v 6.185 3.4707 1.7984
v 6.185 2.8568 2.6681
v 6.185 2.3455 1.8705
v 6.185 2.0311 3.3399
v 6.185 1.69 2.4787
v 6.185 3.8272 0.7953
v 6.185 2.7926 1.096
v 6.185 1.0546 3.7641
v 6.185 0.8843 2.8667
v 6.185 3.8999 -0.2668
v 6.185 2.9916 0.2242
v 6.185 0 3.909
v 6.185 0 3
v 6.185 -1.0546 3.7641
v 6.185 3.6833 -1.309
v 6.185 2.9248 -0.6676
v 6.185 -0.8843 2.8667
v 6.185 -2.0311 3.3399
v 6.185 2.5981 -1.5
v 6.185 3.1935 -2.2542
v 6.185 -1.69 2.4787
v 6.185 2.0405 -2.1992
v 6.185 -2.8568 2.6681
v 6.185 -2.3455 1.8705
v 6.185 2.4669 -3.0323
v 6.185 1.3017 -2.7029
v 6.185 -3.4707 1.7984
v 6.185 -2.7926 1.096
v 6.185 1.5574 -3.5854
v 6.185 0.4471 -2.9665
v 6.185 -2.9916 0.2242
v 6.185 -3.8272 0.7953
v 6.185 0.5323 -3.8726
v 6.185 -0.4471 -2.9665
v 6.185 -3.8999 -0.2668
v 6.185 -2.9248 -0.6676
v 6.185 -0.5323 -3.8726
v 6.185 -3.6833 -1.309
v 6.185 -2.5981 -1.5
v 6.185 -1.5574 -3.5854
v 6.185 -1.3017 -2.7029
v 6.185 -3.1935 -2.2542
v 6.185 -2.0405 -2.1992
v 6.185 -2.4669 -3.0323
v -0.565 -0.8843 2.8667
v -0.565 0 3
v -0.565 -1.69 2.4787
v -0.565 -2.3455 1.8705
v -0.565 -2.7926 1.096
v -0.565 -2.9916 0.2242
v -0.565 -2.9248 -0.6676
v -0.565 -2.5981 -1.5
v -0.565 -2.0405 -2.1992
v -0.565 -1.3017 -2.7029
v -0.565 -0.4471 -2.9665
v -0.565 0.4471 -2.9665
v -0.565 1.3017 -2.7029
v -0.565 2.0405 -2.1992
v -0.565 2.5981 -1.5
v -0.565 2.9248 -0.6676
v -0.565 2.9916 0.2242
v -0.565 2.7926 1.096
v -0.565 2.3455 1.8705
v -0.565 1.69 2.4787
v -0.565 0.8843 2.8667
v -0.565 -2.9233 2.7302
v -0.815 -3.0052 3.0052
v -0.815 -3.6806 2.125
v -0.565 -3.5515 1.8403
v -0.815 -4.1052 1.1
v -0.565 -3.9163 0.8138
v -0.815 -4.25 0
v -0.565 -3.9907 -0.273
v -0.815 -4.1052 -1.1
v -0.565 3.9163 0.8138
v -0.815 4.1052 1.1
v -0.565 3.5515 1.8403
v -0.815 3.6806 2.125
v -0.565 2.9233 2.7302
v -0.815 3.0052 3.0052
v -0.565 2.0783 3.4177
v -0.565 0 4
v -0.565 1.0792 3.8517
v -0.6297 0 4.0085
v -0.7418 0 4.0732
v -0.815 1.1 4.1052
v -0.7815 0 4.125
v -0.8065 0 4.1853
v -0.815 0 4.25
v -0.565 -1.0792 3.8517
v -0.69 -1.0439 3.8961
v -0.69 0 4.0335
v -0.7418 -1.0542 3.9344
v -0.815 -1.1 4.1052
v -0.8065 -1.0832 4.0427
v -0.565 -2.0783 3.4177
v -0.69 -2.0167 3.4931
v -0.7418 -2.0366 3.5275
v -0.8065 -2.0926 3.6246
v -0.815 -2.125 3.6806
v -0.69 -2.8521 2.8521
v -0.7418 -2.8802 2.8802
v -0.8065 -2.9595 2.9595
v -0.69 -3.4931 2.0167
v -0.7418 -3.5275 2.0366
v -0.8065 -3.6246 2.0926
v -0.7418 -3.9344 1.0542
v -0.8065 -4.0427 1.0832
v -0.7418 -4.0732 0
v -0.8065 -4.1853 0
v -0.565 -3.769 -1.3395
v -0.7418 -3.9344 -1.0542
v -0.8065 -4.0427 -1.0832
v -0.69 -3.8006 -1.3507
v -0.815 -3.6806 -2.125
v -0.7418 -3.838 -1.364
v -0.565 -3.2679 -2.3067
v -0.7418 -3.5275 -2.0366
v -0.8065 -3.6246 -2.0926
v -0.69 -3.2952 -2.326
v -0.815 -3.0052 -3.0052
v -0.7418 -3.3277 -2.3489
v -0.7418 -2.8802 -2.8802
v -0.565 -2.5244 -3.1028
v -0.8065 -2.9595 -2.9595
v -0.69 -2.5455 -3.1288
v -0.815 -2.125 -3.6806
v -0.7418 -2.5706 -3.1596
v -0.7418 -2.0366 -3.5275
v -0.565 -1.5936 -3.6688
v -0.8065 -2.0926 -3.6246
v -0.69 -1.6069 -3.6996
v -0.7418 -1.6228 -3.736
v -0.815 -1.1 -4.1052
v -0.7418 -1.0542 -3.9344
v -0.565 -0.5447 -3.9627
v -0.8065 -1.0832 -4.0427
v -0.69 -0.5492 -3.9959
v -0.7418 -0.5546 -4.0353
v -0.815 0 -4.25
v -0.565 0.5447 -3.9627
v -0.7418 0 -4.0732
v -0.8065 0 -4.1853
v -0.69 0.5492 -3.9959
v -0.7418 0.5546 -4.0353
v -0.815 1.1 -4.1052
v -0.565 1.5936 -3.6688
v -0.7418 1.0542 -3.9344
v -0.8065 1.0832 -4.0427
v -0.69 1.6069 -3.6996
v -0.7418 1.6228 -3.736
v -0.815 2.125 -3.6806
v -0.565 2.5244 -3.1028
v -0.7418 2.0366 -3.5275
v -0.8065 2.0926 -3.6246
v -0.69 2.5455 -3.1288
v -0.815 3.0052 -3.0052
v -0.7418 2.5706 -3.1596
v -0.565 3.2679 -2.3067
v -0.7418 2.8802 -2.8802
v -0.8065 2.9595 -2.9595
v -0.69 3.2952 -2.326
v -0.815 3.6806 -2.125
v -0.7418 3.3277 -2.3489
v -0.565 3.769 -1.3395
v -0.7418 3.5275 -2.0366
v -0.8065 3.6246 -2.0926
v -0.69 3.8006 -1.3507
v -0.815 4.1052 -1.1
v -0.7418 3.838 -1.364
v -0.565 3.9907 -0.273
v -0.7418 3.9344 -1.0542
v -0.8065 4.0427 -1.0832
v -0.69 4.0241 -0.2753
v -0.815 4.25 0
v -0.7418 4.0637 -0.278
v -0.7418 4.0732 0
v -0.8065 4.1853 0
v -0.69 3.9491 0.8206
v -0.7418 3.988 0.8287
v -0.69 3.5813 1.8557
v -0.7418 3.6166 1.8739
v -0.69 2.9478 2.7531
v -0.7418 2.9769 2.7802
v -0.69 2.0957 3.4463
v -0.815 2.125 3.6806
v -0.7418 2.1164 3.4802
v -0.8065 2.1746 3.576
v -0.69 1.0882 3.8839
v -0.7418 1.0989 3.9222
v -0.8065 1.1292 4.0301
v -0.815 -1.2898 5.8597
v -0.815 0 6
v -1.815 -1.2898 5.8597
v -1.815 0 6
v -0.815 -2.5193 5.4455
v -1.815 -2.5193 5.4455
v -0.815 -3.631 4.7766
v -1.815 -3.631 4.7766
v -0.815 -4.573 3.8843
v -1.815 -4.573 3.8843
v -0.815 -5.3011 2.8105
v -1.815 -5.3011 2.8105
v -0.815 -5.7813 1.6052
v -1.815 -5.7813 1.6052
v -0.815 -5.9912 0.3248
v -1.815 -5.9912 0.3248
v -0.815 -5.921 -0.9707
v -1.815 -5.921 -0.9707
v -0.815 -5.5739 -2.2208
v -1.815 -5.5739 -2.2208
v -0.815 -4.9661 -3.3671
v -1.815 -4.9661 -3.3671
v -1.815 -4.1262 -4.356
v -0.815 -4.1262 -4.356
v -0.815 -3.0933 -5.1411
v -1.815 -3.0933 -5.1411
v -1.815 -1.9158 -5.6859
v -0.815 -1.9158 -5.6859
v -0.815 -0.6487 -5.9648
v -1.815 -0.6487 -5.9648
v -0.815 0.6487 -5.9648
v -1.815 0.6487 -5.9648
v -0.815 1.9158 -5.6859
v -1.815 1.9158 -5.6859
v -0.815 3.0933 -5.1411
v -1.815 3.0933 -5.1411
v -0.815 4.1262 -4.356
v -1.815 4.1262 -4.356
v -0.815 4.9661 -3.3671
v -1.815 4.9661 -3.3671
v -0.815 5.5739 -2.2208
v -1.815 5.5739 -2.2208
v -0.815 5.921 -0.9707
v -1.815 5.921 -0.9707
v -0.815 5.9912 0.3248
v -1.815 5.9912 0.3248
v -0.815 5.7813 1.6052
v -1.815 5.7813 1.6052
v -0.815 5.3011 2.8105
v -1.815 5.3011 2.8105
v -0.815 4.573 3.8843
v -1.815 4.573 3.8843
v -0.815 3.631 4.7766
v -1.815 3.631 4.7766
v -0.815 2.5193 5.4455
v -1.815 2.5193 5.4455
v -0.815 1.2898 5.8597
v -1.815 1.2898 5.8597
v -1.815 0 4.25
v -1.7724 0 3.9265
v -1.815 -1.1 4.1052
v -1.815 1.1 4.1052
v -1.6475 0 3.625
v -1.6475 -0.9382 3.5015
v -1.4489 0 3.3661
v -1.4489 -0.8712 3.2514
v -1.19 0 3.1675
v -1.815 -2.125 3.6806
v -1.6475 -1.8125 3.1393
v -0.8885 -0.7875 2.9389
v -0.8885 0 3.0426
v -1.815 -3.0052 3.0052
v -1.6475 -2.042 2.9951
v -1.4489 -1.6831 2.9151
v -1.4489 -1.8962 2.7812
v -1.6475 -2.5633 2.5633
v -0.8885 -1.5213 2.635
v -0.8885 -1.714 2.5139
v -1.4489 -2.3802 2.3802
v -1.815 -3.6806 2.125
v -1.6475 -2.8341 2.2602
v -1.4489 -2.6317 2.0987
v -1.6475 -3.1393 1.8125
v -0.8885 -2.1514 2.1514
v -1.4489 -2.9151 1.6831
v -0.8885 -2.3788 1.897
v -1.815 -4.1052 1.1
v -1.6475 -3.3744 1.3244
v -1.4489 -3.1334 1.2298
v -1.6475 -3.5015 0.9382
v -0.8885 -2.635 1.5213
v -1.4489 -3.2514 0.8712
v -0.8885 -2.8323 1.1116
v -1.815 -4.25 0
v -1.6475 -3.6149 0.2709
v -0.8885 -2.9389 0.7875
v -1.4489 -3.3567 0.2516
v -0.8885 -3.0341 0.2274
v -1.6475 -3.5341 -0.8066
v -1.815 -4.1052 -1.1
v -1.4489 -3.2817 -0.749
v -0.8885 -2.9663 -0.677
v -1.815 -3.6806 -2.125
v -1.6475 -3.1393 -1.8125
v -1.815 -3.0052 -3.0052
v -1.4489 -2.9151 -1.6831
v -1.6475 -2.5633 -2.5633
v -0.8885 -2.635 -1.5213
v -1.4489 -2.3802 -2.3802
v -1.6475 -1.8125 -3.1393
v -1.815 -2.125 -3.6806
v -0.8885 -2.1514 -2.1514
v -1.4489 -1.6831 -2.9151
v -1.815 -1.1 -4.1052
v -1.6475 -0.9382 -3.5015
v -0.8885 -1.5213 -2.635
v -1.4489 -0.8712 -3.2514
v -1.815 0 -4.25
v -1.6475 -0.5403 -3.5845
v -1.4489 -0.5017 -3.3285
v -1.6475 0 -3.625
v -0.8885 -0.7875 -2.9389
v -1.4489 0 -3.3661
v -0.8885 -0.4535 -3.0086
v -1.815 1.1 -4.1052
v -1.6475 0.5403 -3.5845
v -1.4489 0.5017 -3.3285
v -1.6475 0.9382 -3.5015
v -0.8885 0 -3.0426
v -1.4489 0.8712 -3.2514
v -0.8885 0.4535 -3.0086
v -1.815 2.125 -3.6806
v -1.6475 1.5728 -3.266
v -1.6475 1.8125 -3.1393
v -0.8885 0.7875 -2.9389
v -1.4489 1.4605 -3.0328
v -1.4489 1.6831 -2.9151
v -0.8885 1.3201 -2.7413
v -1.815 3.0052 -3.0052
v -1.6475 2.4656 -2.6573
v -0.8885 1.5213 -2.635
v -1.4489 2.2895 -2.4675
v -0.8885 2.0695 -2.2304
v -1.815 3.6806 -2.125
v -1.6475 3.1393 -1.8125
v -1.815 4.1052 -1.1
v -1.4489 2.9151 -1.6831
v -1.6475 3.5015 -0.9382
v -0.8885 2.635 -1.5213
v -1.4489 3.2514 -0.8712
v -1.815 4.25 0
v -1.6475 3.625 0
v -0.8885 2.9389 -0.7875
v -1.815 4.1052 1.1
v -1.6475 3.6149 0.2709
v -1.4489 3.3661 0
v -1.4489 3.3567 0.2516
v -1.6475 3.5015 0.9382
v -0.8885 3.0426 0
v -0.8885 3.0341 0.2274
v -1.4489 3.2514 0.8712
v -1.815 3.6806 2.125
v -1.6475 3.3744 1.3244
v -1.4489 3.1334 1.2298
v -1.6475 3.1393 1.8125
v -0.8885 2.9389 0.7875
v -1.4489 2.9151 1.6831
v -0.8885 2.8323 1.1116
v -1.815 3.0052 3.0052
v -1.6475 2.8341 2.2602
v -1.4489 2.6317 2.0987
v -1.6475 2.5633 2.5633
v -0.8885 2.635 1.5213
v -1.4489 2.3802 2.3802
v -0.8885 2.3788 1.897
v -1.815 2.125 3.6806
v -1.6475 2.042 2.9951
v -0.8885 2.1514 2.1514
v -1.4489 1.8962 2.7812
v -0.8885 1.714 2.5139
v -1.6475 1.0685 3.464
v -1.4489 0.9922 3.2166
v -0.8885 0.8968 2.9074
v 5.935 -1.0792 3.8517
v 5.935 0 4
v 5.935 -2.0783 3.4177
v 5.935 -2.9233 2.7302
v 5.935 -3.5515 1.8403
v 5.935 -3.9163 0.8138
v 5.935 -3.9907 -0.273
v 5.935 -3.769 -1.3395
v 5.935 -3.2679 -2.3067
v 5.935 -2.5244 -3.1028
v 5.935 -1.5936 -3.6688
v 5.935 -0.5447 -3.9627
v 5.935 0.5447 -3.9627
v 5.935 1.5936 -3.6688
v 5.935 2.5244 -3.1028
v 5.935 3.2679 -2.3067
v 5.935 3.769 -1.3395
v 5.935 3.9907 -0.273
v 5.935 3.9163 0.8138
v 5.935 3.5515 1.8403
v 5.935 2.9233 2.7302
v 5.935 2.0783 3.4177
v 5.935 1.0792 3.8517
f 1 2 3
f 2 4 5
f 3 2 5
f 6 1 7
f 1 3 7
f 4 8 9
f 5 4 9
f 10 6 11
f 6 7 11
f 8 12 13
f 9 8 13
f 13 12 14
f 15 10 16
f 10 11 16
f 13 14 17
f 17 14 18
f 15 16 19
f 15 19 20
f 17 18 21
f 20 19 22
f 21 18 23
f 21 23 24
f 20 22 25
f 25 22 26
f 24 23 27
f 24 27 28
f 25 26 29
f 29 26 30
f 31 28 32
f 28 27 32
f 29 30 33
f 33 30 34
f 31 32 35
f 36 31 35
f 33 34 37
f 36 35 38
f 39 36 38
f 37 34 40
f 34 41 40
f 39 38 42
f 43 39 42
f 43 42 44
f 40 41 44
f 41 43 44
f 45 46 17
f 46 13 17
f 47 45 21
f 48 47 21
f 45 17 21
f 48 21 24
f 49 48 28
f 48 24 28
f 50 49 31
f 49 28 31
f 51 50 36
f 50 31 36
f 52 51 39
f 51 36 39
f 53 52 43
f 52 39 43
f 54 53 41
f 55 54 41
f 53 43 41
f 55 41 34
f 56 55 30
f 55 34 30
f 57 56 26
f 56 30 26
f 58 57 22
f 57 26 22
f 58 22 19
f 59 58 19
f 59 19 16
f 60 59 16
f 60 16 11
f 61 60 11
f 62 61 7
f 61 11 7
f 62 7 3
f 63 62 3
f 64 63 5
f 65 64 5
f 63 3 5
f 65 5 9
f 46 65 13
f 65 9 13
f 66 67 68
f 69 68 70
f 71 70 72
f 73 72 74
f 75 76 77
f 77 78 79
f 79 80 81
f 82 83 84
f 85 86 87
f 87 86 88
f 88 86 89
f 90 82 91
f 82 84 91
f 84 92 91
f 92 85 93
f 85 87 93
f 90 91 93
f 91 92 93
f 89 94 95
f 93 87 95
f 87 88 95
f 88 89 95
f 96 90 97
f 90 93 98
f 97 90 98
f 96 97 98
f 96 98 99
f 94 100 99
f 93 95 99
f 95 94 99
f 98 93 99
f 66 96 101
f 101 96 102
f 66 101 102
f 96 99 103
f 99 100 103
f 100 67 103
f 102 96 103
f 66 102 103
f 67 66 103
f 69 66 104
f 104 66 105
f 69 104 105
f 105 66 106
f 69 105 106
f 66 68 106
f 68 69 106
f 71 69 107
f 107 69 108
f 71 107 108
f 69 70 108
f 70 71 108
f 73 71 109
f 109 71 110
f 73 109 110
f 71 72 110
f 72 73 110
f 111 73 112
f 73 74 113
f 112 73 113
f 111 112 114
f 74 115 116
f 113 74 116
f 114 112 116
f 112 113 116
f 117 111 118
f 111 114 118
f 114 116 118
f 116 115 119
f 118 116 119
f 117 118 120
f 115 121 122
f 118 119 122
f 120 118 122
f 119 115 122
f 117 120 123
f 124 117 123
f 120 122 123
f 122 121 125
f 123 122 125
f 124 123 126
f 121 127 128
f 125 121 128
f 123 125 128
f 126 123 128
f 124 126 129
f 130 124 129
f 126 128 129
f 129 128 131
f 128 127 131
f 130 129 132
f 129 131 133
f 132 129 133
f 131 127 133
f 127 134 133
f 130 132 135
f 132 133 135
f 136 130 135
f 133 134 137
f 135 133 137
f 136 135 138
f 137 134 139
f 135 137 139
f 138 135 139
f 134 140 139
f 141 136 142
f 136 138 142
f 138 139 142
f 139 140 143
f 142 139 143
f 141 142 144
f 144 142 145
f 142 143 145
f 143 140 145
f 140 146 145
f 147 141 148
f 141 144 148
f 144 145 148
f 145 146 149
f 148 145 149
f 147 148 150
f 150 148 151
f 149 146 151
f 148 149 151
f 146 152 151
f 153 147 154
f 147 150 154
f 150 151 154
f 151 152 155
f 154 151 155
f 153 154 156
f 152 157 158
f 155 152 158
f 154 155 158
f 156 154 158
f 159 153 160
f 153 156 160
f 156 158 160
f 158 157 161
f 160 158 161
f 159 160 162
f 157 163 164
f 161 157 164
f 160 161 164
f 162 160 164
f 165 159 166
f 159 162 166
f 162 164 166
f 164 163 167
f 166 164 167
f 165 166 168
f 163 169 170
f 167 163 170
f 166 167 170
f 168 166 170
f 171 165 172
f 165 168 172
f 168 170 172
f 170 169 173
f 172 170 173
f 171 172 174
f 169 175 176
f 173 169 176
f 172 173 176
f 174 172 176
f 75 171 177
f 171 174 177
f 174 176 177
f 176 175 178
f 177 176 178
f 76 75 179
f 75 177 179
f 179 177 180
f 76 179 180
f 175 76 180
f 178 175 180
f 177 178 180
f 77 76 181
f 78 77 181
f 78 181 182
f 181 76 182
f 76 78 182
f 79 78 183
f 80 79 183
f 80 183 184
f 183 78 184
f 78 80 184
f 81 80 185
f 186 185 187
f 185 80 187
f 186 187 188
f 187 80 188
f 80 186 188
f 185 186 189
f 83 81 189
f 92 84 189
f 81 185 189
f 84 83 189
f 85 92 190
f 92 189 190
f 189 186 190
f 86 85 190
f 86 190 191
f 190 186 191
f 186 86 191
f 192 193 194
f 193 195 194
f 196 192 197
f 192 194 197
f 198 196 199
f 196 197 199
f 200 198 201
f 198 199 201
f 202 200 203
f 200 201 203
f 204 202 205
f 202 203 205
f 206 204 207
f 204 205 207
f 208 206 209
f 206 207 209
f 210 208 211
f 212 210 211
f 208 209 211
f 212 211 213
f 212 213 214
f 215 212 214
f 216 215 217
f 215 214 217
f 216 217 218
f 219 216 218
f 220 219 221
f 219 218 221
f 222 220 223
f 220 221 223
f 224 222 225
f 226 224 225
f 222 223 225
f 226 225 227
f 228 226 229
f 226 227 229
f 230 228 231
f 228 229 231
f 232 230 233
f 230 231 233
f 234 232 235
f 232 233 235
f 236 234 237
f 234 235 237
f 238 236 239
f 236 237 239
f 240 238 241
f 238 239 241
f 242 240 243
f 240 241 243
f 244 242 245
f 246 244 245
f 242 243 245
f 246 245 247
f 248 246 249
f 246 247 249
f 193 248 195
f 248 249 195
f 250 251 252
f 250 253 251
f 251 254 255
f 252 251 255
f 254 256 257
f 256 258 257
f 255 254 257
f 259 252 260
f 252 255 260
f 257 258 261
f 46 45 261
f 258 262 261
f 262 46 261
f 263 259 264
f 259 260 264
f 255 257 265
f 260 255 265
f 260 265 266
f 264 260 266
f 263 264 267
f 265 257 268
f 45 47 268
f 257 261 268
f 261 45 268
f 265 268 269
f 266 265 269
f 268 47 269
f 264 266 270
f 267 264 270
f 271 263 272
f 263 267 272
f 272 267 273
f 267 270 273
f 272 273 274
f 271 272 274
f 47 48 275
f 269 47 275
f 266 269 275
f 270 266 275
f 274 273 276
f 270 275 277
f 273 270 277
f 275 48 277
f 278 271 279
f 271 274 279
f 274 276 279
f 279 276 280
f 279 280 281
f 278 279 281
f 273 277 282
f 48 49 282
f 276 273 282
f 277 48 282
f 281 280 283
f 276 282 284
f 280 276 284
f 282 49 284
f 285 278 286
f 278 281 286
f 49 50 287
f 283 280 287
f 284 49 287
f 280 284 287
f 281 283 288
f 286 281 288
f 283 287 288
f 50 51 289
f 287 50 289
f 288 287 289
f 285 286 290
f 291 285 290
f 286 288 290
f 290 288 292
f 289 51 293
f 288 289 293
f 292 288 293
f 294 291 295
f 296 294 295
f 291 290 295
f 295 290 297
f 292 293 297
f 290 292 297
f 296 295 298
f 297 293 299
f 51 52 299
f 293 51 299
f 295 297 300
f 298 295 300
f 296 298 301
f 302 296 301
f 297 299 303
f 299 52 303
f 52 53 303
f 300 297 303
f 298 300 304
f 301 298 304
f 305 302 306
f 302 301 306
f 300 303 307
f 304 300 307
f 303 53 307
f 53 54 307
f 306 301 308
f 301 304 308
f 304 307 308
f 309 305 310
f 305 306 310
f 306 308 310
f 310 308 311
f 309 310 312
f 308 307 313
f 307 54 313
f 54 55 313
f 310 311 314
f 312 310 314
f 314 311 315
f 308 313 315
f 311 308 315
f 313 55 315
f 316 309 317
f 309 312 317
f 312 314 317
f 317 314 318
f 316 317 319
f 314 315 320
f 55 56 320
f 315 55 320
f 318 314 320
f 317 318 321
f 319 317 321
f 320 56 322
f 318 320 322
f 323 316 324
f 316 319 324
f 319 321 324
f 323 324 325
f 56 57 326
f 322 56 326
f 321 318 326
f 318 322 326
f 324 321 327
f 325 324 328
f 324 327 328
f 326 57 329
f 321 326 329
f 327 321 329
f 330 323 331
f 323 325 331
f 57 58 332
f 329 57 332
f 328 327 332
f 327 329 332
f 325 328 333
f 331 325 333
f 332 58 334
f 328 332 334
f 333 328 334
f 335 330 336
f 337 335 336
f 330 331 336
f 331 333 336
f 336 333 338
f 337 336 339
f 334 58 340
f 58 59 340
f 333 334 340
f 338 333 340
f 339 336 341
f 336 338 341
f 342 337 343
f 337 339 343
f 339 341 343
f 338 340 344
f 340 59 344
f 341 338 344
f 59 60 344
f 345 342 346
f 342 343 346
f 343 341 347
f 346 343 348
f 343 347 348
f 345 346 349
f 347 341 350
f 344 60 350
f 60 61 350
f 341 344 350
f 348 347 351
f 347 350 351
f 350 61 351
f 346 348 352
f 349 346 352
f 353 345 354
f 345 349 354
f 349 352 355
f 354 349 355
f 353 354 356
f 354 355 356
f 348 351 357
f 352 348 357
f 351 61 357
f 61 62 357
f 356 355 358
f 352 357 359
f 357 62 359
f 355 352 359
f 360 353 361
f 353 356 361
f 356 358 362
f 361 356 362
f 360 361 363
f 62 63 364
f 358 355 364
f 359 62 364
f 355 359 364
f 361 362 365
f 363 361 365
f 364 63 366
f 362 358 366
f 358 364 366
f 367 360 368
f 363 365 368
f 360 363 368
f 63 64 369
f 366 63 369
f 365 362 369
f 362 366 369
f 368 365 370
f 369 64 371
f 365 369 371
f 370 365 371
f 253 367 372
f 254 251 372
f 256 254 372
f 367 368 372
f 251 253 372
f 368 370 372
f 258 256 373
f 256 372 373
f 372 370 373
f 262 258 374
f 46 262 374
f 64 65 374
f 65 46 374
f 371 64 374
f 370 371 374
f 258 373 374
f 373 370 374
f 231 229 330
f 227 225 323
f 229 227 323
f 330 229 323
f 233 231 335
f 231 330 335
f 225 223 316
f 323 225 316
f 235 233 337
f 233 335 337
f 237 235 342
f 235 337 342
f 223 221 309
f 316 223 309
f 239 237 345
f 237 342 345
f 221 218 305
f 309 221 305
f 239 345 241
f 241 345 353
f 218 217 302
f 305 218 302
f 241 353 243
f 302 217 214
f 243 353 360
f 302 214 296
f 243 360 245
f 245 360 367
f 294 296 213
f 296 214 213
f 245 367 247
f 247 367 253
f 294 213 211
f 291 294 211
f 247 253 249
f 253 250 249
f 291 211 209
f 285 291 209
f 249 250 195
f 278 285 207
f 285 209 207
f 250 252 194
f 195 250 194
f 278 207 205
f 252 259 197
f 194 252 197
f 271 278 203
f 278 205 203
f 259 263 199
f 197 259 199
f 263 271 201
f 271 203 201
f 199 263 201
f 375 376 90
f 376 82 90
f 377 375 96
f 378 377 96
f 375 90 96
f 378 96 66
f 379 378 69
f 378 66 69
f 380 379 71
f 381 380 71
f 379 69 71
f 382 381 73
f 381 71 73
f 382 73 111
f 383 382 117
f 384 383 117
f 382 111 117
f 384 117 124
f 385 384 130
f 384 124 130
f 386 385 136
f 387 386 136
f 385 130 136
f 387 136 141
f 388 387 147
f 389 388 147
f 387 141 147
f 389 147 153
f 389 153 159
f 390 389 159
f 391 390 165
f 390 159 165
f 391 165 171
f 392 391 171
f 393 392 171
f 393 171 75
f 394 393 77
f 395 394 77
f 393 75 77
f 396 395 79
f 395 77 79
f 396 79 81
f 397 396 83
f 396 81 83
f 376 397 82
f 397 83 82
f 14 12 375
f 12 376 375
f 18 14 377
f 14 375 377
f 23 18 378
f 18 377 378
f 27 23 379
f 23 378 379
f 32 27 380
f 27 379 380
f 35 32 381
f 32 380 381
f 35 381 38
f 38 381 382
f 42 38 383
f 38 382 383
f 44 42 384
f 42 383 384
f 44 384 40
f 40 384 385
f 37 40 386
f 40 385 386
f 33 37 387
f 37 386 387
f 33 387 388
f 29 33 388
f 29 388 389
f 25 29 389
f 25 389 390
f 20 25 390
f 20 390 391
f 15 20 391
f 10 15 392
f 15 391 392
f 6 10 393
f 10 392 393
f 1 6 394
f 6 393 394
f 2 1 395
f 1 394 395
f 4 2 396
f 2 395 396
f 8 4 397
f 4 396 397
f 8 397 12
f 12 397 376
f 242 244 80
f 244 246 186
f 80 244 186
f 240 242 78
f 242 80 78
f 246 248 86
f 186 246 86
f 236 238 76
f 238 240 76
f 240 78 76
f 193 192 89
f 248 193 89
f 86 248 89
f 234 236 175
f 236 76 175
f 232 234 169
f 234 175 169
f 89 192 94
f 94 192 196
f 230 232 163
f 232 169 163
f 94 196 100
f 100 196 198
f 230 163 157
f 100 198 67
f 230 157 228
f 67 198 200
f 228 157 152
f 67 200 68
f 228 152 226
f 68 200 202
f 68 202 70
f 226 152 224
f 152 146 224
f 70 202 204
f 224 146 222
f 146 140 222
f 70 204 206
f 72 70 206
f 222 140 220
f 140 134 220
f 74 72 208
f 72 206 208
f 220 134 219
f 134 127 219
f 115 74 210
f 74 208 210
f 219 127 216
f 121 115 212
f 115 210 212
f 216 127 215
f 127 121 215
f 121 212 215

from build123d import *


with BuildPart() as f1:
    # F0 (on Front) → F1 (revolve)
    with BuildSketch(Plane.XZ):
        with BuildLine():
            ThreePointArc((-1.815014, 4.25), (-1.448898, 3.366117), (-0.565014, 3))
            Line((-0.565014, 3), (6.184986, 3))
            Line((6.184986, 3), (6.184986, 3.909007))
            Line((6.184986, 3.909007), (5.934986, 4))
            Line((5.934986, 4), (-0.565014, 4))
            ThreePointArc((-0.565014, 4), (-0.741791, 4.073223), (-0.815014, 4.25))
            Line((-0.815014, 4.25), (-0.815014, 6))
            Line((-0.815014, 6), (-1.815014, 6))
            Line((-1.815014, 6), (-1.815014, 4.25))
        make_face()
    revolve(axis=Axis((-0.667828, 0, 0), (1, 0, 0)))


solid = f1.part
